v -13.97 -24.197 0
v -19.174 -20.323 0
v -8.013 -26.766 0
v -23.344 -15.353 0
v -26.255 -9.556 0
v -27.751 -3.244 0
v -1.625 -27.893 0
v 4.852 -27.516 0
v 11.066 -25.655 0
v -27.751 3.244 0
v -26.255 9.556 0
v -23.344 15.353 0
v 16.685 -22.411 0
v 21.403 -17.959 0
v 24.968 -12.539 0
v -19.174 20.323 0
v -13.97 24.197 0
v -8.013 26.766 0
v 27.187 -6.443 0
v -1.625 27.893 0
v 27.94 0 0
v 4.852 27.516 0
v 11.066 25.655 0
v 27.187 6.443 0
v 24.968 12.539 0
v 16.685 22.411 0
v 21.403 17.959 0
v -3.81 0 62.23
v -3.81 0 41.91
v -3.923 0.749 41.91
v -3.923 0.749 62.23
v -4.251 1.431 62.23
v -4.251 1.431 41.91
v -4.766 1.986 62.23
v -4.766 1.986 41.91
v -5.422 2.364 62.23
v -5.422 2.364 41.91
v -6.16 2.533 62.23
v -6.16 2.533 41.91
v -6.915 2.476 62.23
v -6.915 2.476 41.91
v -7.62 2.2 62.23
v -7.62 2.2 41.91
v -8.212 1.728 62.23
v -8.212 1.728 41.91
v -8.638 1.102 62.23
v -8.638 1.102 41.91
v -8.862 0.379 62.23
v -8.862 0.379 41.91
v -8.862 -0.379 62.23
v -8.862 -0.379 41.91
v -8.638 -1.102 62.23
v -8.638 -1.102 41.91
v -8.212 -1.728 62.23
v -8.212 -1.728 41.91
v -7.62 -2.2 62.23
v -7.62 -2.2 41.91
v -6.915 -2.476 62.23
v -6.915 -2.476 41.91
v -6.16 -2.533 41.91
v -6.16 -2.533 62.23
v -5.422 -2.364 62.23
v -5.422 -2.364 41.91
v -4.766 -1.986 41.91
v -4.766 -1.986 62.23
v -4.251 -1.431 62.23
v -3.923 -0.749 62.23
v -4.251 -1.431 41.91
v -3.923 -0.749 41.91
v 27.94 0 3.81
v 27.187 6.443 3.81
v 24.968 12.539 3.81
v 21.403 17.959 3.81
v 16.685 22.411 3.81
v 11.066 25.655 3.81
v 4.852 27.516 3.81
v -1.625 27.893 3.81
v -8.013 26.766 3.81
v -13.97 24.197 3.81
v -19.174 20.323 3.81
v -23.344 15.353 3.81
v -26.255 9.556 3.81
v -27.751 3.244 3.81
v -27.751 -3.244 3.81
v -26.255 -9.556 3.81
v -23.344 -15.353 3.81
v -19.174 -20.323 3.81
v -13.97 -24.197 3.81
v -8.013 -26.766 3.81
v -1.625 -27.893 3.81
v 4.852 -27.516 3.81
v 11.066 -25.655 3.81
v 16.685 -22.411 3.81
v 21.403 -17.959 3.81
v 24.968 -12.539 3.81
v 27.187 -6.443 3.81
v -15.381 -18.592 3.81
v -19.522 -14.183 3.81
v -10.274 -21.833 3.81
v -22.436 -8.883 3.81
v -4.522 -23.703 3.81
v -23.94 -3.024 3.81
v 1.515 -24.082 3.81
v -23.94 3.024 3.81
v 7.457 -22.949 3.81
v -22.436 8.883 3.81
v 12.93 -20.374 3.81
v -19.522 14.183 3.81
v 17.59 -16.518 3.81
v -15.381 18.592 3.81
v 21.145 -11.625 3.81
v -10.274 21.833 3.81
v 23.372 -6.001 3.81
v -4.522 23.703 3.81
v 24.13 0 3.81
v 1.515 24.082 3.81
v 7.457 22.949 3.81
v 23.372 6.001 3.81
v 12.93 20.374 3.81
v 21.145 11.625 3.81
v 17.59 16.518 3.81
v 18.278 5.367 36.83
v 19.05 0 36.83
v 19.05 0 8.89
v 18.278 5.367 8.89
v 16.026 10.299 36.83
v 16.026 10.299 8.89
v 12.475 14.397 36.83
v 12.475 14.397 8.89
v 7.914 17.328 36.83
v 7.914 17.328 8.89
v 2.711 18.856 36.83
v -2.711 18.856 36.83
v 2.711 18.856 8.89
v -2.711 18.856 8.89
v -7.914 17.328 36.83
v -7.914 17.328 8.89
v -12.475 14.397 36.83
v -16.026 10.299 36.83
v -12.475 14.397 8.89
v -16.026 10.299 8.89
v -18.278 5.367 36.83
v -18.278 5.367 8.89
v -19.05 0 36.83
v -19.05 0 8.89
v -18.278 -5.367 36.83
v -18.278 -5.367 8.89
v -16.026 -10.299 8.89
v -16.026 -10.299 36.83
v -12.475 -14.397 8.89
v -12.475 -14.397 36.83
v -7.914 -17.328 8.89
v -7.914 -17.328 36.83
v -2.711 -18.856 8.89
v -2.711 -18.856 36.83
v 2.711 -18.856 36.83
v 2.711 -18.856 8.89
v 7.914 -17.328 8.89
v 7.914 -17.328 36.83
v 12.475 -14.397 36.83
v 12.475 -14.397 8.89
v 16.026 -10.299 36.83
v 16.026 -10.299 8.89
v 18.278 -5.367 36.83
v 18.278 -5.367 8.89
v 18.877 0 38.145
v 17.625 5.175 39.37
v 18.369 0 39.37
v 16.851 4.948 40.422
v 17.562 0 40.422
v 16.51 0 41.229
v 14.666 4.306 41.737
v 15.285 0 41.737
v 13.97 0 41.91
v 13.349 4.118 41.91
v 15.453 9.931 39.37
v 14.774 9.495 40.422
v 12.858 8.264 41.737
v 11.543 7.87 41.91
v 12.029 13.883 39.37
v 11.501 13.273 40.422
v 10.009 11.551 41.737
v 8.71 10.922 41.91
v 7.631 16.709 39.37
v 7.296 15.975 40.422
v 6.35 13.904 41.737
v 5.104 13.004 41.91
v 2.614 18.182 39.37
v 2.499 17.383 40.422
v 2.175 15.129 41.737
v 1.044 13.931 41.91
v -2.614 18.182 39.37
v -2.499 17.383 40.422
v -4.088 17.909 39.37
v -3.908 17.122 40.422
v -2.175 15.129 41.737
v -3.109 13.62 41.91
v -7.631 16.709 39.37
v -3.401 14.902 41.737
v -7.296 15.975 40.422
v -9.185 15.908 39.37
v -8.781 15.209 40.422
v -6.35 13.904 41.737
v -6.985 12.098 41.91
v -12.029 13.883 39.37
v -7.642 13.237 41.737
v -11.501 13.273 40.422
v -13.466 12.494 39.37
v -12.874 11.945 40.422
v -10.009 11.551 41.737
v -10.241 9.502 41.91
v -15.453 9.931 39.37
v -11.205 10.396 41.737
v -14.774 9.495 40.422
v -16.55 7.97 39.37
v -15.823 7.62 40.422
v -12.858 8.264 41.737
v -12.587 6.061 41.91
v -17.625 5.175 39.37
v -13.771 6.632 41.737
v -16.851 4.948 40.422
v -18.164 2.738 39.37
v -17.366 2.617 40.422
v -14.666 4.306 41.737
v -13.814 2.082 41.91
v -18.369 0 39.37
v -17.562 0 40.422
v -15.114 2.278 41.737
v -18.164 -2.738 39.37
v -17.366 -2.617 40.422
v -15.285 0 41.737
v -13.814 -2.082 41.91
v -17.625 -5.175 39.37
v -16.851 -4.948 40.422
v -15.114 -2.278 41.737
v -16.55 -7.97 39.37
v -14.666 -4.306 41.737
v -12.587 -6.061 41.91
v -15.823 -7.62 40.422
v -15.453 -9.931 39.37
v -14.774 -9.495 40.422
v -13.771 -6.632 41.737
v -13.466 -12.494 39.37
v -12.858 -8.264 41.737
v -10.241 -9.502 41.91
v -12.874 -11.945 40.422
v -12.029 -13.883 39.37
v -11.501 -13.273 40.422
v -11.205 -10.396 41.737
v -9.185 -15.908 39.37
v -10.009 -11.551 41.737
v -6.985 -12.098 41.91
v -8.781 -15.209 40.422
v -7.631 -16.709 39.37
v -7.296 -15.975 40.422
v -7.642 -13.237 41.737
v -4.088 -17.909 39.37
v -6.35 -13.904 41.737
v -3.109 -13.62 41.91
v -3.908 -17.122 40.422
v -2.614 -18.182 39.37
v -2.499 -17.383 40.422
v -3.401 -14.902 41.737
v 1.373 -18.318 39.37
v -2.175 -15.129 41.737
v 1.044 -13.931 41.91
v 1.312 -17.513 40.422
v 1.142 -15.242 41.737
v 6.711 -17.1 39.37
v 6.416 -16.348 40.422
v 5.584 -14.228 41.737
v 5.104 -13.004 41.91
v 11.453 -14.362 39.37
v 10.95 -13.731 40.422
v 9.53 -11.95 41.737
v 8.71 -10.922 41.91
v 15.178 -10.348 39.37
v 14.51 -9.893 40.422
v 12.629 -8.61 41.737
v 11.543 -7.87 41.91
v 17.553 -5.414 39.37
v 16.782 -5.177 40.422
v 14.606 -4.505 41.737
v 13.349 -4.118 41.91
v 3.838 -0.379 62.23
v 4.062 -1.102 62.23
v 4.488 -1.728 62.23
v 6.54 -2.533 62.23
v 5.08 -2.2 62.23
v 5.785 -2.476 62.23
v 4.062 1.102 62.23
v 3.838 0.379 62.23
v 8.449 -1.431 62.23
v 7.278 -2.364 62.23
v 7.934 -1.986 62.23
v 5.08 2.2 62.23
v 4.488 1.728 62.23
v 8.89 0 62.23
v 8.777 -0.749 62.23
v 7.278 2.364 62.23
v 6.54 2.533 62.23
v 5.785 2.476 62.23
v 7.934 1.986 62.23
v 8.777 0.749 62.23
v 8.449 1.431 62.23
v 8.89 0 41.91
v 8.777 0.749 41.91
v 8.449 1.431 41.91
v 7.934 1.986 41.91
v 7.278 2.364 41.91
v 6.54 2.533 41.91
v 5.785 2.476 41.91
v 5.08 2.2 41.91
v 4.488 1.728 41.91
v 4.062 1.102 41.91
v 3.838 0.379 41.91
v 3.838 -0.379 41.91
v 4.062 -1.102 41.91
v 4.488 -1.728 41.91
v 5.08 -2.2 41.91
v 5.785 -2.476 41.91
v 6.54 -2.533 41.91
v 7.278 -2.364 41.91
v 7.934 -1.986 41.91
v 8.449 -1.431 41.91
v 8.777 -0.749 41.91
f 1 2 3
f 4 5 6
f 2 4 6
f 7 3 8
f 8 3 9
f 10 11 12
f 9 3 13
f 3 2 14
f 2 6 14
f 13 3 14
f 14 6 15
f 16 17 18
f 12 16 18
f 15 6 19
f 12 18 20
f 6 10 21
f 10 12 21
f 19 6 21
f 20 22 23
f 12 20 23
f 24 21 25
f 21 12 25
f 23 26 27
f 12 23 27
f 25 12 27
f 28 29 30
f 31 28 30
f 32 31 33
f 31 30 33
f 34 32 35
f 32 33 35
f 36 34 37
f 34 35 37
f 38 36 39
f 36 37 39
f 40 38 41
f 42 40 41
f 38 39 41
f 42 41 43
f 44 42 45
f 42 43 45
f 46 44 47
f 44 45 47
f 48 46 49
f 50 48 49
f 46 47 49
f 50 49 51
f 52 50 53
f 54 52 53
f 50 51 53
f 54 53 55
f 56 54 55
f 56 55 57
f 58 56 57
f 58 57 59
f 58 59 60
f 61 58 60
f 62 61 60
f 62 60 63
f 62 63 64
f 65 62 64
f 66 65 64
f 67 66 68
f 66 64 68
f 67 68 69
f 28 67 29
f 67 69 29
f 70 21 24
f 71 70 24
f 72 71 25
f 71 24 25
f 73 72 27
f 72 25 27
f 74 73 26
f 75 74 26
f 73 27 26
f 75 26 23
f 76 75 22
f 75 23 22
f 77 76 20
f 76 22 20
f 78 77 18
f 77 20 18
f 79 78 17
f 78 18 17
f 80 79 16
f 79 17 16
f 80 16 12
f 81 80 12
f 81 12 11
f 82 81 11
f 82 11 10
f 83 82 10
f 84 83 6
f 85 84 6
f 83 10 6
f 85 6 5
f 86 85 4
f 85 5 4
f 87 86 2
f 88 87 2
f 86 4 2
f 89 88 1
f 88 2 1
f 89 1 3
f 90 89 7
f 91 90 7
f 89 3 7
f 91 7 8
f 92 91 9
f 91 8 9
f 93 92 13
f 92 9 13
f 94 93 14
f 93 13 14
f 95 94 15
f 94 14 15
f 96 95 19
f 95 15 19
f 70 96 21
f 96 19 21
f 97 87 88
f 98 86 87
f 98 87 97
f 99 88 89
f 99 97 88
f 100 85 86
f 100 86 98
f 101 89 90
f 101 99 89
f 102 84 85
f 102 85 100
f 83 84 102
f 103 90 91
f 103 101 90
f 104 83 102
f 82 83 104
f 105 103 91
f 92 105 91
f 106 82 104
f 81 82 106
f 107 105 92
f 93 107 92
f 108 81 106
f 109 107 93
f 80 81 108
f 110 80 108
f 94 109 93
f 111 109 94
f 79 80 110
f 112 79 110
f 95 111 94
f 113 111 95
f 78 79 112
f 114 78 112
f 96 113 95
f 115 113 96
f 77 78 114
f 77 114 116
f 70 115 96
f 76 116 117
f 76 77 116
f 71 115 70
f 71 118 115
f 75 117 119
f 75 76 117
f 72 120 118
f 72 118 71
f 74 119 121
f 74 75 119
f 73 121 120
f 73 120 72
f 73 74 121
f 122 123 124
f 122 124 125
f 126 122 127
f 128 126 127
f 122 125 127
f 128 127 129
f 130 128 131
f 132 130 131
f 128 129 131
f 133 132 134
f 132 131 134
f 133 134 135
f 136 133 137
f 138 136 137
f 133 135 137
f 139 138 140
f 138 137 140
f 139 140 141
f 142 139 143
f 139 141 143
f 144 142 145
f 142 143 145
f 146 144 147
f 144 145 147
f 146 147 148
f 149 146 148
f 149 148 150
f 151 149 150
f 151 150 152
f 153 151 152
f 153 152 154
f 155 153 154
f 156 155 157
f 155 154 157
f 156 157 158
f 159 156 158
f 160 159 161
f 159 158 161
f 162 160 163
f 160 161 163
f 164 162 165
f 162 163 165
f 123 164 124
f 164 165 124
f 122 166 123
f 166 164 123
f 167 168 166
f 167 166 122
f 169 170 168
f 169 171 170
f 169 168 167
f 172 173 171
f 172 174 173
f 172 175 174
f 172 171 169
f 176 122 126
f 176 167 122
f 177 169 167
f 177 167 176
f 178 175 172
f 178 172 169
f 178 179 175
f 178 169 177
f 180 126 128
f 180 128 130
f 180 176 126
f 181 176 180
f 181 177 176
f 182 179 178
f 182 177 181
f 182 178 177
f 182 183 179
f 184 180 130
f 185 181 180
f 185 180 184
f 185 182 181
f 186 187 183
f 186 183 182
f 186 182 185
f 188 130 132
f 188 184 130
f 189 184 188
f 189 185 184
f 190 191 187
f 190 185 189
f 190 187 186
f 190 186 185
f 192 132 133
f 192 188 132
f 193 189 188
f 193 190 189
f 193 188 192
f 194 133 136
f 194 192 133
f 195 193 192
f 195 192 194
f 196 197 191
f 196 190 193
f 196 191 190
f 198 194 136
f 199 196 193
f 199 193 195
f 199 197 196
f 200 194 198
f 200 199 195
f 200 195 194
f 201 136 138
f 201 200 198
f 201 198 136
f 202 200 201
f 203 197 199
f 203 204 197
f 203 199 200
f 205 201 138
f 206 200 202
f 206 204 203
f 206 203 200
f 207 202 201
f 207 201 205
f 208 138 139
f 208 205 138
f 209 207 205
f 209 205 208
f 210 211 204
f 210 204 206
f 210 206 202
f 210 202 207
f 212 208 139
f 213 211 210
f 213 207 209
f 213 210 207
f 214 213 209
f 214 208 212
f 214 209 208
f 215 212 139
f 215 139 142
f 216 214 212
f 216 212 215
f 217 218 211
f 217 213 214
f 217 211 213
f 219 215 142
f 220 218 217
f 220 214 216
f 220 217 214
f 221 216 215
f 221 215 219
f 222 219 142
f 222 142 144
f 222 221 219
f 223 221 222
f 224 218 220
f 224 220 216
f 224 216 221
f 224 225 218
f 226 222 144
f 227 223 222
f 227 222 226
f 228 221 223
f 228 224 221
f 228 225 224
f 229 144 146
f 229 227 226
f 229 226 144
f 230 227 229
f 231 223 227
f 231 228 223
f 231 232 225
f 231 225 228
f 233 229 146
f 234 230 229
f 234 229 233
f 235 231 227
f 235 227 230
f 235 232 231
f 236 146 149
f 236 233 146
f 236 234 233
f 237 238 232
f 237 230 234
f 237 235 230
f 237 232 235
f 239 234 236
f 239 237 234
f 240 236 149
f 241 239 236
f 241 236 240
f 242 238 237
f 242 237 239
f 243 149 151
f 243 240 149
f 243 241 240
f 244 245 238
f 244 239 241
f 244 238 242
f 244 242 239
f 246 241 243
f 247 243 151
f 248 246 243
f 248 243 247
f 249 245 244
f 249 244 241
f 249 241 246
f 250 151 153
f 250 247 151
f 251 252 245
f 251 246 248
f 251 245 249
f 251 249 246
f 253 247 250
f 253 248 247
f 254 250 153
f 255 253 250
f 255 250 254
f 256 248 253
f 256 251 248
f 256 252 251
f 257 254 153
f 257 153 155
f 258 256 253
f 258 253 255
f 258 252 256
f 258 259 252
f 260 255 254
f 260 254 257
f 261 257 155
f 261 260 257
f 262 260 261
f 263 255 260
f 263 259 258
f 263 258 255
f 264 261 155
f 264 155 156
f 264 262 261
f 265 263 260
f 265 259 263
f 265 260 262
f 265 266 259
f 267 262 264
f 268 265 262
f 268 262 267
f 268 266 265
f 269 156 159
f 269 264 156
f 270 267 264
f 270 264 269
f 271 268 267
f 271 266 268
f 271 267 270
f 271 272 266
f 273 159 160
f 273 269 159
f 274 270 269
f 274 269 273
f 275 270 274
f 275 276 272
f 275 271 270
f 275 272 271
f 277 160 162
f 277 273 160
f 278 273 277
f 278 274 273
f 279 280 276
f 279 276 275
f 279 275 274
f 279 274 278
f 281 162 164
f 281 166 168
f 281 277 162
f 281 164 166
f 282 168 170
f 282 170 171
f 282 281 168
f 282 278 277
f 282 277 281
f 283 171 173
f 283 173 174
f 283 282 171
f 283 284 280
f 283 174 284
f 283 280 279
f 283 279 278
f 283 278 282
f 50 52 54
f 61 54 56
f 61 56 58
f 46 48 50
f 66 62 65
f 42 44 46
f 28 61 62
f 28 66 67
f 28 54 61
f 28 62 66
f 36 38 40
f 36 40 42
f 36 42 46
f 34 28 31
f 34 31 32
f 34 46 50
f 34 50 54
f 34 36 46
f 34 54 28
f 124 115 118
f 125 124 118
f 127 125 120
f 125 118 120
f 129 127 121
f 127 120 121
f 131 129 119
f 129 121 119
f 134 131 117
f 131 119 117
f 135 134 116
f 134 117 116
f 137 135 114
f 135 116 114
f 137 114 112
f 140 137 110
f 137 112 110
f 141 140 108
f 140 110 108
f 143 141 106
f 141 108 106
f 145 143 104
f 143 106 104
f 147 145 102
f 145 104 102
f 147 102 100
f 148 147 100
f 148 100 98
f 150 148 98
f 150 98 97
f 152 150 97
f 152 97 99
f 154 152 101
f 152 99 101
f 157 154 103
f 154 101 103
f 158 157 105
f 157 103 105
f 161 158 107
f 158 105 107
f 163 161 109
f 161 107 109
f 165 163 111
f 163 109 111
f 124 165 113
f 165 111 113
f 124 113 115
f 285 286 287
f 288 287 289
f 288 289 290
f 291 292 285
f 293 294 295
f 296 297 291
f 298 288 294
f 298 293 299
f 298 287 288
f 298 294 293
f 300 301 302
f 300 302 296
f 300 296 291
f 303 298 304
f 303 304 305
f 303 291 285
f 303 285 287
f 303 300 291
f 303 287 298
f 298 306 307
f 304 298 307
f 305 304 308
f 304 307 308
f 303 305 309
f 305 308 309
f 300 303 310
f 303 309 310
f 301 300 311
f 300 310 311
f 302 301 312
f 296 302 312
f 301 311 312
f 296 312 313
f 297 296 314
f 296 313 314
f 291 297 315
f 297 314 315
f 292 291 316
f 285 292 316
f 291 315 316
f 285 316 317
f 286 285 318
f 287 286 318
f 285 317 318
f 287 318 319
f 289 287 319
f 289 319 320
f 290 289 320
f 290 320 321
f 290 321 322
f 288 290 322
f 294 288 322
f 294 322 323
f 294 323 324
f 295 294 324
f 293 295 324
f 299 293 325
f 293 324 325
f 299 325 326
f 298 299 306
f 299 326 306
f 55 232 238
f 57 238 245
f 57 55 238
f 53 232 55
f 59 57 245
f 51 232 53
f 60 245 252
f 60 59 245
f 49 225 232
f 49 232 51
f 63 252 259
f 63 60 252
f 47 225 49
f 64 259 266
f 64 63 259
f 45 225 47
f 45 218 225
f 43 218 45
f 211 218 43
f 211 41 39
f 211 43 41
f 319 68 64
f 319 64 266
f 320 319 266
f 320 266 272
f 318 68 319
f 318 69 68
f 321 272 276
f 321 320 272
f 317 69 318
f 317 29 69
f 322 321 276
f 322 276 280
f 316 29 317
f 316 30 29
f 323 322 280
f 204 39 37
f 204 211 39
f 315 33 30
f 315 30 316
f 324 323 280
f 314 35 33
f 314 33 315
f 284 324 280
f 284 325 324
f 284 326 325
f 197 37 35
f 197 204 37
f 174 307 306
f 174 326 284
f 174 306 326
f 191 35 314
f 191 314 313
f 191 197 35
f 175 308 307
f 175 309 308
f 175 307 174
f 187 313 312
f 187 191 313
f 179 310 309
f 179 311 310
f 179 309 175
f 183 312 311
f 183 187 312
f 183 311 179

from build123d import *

# Parameters (mm, degrees)
F0_R     = 27.94
F1_DEPTH = 3.81
F2_R     = 19.05
F3_DEPTH = 38.1
F4_R     = 5.08
F5_SIZE  = 5.08
F6_R     = 2.54
F7_DEPTH = 20.32


with BuildPart() as f1:
    # F0 (on Top) → F1 (new body)
    with BuildSketch(Plane.XY):
        Circle(F0_R)
    extrude(amount=F1_DEPTH)

    # F2 (on face) → F3 (join)
    with BuildSketch(Plane.XY.offset(3.81)):
        Circle(F2_R)
    extrude(amount=F3_DEPTH)

    # F4
    f4_edges = [f1.edges().sort_by_distance(p)[0] for p in [
        (-19.05, 0, 41.91),
    ]]
    fillet(f4_edges, radius=F4_R)

    # F5
    f5_edges = [f1.edges().sort_by_distance(p)[0] for p in [
        (19.05, 0, 20.32),
        (-19.05, 0, 36.83),
        (-19.05, 0, 3.81),
    ]]
    chamfer(f5_edges, length=F5_SIZE)

    # F6 (on face) → F7 (join)
    with BuildSketch(Plane.XY.offset(41.91)):
        with Locations((-6.35, 0)):
            Circle(F6_R)
        with Locations((6.35, 0)):
            Circle(F6_R)
    extrude(amount=F7_DEPTH)


solid = f1.part
